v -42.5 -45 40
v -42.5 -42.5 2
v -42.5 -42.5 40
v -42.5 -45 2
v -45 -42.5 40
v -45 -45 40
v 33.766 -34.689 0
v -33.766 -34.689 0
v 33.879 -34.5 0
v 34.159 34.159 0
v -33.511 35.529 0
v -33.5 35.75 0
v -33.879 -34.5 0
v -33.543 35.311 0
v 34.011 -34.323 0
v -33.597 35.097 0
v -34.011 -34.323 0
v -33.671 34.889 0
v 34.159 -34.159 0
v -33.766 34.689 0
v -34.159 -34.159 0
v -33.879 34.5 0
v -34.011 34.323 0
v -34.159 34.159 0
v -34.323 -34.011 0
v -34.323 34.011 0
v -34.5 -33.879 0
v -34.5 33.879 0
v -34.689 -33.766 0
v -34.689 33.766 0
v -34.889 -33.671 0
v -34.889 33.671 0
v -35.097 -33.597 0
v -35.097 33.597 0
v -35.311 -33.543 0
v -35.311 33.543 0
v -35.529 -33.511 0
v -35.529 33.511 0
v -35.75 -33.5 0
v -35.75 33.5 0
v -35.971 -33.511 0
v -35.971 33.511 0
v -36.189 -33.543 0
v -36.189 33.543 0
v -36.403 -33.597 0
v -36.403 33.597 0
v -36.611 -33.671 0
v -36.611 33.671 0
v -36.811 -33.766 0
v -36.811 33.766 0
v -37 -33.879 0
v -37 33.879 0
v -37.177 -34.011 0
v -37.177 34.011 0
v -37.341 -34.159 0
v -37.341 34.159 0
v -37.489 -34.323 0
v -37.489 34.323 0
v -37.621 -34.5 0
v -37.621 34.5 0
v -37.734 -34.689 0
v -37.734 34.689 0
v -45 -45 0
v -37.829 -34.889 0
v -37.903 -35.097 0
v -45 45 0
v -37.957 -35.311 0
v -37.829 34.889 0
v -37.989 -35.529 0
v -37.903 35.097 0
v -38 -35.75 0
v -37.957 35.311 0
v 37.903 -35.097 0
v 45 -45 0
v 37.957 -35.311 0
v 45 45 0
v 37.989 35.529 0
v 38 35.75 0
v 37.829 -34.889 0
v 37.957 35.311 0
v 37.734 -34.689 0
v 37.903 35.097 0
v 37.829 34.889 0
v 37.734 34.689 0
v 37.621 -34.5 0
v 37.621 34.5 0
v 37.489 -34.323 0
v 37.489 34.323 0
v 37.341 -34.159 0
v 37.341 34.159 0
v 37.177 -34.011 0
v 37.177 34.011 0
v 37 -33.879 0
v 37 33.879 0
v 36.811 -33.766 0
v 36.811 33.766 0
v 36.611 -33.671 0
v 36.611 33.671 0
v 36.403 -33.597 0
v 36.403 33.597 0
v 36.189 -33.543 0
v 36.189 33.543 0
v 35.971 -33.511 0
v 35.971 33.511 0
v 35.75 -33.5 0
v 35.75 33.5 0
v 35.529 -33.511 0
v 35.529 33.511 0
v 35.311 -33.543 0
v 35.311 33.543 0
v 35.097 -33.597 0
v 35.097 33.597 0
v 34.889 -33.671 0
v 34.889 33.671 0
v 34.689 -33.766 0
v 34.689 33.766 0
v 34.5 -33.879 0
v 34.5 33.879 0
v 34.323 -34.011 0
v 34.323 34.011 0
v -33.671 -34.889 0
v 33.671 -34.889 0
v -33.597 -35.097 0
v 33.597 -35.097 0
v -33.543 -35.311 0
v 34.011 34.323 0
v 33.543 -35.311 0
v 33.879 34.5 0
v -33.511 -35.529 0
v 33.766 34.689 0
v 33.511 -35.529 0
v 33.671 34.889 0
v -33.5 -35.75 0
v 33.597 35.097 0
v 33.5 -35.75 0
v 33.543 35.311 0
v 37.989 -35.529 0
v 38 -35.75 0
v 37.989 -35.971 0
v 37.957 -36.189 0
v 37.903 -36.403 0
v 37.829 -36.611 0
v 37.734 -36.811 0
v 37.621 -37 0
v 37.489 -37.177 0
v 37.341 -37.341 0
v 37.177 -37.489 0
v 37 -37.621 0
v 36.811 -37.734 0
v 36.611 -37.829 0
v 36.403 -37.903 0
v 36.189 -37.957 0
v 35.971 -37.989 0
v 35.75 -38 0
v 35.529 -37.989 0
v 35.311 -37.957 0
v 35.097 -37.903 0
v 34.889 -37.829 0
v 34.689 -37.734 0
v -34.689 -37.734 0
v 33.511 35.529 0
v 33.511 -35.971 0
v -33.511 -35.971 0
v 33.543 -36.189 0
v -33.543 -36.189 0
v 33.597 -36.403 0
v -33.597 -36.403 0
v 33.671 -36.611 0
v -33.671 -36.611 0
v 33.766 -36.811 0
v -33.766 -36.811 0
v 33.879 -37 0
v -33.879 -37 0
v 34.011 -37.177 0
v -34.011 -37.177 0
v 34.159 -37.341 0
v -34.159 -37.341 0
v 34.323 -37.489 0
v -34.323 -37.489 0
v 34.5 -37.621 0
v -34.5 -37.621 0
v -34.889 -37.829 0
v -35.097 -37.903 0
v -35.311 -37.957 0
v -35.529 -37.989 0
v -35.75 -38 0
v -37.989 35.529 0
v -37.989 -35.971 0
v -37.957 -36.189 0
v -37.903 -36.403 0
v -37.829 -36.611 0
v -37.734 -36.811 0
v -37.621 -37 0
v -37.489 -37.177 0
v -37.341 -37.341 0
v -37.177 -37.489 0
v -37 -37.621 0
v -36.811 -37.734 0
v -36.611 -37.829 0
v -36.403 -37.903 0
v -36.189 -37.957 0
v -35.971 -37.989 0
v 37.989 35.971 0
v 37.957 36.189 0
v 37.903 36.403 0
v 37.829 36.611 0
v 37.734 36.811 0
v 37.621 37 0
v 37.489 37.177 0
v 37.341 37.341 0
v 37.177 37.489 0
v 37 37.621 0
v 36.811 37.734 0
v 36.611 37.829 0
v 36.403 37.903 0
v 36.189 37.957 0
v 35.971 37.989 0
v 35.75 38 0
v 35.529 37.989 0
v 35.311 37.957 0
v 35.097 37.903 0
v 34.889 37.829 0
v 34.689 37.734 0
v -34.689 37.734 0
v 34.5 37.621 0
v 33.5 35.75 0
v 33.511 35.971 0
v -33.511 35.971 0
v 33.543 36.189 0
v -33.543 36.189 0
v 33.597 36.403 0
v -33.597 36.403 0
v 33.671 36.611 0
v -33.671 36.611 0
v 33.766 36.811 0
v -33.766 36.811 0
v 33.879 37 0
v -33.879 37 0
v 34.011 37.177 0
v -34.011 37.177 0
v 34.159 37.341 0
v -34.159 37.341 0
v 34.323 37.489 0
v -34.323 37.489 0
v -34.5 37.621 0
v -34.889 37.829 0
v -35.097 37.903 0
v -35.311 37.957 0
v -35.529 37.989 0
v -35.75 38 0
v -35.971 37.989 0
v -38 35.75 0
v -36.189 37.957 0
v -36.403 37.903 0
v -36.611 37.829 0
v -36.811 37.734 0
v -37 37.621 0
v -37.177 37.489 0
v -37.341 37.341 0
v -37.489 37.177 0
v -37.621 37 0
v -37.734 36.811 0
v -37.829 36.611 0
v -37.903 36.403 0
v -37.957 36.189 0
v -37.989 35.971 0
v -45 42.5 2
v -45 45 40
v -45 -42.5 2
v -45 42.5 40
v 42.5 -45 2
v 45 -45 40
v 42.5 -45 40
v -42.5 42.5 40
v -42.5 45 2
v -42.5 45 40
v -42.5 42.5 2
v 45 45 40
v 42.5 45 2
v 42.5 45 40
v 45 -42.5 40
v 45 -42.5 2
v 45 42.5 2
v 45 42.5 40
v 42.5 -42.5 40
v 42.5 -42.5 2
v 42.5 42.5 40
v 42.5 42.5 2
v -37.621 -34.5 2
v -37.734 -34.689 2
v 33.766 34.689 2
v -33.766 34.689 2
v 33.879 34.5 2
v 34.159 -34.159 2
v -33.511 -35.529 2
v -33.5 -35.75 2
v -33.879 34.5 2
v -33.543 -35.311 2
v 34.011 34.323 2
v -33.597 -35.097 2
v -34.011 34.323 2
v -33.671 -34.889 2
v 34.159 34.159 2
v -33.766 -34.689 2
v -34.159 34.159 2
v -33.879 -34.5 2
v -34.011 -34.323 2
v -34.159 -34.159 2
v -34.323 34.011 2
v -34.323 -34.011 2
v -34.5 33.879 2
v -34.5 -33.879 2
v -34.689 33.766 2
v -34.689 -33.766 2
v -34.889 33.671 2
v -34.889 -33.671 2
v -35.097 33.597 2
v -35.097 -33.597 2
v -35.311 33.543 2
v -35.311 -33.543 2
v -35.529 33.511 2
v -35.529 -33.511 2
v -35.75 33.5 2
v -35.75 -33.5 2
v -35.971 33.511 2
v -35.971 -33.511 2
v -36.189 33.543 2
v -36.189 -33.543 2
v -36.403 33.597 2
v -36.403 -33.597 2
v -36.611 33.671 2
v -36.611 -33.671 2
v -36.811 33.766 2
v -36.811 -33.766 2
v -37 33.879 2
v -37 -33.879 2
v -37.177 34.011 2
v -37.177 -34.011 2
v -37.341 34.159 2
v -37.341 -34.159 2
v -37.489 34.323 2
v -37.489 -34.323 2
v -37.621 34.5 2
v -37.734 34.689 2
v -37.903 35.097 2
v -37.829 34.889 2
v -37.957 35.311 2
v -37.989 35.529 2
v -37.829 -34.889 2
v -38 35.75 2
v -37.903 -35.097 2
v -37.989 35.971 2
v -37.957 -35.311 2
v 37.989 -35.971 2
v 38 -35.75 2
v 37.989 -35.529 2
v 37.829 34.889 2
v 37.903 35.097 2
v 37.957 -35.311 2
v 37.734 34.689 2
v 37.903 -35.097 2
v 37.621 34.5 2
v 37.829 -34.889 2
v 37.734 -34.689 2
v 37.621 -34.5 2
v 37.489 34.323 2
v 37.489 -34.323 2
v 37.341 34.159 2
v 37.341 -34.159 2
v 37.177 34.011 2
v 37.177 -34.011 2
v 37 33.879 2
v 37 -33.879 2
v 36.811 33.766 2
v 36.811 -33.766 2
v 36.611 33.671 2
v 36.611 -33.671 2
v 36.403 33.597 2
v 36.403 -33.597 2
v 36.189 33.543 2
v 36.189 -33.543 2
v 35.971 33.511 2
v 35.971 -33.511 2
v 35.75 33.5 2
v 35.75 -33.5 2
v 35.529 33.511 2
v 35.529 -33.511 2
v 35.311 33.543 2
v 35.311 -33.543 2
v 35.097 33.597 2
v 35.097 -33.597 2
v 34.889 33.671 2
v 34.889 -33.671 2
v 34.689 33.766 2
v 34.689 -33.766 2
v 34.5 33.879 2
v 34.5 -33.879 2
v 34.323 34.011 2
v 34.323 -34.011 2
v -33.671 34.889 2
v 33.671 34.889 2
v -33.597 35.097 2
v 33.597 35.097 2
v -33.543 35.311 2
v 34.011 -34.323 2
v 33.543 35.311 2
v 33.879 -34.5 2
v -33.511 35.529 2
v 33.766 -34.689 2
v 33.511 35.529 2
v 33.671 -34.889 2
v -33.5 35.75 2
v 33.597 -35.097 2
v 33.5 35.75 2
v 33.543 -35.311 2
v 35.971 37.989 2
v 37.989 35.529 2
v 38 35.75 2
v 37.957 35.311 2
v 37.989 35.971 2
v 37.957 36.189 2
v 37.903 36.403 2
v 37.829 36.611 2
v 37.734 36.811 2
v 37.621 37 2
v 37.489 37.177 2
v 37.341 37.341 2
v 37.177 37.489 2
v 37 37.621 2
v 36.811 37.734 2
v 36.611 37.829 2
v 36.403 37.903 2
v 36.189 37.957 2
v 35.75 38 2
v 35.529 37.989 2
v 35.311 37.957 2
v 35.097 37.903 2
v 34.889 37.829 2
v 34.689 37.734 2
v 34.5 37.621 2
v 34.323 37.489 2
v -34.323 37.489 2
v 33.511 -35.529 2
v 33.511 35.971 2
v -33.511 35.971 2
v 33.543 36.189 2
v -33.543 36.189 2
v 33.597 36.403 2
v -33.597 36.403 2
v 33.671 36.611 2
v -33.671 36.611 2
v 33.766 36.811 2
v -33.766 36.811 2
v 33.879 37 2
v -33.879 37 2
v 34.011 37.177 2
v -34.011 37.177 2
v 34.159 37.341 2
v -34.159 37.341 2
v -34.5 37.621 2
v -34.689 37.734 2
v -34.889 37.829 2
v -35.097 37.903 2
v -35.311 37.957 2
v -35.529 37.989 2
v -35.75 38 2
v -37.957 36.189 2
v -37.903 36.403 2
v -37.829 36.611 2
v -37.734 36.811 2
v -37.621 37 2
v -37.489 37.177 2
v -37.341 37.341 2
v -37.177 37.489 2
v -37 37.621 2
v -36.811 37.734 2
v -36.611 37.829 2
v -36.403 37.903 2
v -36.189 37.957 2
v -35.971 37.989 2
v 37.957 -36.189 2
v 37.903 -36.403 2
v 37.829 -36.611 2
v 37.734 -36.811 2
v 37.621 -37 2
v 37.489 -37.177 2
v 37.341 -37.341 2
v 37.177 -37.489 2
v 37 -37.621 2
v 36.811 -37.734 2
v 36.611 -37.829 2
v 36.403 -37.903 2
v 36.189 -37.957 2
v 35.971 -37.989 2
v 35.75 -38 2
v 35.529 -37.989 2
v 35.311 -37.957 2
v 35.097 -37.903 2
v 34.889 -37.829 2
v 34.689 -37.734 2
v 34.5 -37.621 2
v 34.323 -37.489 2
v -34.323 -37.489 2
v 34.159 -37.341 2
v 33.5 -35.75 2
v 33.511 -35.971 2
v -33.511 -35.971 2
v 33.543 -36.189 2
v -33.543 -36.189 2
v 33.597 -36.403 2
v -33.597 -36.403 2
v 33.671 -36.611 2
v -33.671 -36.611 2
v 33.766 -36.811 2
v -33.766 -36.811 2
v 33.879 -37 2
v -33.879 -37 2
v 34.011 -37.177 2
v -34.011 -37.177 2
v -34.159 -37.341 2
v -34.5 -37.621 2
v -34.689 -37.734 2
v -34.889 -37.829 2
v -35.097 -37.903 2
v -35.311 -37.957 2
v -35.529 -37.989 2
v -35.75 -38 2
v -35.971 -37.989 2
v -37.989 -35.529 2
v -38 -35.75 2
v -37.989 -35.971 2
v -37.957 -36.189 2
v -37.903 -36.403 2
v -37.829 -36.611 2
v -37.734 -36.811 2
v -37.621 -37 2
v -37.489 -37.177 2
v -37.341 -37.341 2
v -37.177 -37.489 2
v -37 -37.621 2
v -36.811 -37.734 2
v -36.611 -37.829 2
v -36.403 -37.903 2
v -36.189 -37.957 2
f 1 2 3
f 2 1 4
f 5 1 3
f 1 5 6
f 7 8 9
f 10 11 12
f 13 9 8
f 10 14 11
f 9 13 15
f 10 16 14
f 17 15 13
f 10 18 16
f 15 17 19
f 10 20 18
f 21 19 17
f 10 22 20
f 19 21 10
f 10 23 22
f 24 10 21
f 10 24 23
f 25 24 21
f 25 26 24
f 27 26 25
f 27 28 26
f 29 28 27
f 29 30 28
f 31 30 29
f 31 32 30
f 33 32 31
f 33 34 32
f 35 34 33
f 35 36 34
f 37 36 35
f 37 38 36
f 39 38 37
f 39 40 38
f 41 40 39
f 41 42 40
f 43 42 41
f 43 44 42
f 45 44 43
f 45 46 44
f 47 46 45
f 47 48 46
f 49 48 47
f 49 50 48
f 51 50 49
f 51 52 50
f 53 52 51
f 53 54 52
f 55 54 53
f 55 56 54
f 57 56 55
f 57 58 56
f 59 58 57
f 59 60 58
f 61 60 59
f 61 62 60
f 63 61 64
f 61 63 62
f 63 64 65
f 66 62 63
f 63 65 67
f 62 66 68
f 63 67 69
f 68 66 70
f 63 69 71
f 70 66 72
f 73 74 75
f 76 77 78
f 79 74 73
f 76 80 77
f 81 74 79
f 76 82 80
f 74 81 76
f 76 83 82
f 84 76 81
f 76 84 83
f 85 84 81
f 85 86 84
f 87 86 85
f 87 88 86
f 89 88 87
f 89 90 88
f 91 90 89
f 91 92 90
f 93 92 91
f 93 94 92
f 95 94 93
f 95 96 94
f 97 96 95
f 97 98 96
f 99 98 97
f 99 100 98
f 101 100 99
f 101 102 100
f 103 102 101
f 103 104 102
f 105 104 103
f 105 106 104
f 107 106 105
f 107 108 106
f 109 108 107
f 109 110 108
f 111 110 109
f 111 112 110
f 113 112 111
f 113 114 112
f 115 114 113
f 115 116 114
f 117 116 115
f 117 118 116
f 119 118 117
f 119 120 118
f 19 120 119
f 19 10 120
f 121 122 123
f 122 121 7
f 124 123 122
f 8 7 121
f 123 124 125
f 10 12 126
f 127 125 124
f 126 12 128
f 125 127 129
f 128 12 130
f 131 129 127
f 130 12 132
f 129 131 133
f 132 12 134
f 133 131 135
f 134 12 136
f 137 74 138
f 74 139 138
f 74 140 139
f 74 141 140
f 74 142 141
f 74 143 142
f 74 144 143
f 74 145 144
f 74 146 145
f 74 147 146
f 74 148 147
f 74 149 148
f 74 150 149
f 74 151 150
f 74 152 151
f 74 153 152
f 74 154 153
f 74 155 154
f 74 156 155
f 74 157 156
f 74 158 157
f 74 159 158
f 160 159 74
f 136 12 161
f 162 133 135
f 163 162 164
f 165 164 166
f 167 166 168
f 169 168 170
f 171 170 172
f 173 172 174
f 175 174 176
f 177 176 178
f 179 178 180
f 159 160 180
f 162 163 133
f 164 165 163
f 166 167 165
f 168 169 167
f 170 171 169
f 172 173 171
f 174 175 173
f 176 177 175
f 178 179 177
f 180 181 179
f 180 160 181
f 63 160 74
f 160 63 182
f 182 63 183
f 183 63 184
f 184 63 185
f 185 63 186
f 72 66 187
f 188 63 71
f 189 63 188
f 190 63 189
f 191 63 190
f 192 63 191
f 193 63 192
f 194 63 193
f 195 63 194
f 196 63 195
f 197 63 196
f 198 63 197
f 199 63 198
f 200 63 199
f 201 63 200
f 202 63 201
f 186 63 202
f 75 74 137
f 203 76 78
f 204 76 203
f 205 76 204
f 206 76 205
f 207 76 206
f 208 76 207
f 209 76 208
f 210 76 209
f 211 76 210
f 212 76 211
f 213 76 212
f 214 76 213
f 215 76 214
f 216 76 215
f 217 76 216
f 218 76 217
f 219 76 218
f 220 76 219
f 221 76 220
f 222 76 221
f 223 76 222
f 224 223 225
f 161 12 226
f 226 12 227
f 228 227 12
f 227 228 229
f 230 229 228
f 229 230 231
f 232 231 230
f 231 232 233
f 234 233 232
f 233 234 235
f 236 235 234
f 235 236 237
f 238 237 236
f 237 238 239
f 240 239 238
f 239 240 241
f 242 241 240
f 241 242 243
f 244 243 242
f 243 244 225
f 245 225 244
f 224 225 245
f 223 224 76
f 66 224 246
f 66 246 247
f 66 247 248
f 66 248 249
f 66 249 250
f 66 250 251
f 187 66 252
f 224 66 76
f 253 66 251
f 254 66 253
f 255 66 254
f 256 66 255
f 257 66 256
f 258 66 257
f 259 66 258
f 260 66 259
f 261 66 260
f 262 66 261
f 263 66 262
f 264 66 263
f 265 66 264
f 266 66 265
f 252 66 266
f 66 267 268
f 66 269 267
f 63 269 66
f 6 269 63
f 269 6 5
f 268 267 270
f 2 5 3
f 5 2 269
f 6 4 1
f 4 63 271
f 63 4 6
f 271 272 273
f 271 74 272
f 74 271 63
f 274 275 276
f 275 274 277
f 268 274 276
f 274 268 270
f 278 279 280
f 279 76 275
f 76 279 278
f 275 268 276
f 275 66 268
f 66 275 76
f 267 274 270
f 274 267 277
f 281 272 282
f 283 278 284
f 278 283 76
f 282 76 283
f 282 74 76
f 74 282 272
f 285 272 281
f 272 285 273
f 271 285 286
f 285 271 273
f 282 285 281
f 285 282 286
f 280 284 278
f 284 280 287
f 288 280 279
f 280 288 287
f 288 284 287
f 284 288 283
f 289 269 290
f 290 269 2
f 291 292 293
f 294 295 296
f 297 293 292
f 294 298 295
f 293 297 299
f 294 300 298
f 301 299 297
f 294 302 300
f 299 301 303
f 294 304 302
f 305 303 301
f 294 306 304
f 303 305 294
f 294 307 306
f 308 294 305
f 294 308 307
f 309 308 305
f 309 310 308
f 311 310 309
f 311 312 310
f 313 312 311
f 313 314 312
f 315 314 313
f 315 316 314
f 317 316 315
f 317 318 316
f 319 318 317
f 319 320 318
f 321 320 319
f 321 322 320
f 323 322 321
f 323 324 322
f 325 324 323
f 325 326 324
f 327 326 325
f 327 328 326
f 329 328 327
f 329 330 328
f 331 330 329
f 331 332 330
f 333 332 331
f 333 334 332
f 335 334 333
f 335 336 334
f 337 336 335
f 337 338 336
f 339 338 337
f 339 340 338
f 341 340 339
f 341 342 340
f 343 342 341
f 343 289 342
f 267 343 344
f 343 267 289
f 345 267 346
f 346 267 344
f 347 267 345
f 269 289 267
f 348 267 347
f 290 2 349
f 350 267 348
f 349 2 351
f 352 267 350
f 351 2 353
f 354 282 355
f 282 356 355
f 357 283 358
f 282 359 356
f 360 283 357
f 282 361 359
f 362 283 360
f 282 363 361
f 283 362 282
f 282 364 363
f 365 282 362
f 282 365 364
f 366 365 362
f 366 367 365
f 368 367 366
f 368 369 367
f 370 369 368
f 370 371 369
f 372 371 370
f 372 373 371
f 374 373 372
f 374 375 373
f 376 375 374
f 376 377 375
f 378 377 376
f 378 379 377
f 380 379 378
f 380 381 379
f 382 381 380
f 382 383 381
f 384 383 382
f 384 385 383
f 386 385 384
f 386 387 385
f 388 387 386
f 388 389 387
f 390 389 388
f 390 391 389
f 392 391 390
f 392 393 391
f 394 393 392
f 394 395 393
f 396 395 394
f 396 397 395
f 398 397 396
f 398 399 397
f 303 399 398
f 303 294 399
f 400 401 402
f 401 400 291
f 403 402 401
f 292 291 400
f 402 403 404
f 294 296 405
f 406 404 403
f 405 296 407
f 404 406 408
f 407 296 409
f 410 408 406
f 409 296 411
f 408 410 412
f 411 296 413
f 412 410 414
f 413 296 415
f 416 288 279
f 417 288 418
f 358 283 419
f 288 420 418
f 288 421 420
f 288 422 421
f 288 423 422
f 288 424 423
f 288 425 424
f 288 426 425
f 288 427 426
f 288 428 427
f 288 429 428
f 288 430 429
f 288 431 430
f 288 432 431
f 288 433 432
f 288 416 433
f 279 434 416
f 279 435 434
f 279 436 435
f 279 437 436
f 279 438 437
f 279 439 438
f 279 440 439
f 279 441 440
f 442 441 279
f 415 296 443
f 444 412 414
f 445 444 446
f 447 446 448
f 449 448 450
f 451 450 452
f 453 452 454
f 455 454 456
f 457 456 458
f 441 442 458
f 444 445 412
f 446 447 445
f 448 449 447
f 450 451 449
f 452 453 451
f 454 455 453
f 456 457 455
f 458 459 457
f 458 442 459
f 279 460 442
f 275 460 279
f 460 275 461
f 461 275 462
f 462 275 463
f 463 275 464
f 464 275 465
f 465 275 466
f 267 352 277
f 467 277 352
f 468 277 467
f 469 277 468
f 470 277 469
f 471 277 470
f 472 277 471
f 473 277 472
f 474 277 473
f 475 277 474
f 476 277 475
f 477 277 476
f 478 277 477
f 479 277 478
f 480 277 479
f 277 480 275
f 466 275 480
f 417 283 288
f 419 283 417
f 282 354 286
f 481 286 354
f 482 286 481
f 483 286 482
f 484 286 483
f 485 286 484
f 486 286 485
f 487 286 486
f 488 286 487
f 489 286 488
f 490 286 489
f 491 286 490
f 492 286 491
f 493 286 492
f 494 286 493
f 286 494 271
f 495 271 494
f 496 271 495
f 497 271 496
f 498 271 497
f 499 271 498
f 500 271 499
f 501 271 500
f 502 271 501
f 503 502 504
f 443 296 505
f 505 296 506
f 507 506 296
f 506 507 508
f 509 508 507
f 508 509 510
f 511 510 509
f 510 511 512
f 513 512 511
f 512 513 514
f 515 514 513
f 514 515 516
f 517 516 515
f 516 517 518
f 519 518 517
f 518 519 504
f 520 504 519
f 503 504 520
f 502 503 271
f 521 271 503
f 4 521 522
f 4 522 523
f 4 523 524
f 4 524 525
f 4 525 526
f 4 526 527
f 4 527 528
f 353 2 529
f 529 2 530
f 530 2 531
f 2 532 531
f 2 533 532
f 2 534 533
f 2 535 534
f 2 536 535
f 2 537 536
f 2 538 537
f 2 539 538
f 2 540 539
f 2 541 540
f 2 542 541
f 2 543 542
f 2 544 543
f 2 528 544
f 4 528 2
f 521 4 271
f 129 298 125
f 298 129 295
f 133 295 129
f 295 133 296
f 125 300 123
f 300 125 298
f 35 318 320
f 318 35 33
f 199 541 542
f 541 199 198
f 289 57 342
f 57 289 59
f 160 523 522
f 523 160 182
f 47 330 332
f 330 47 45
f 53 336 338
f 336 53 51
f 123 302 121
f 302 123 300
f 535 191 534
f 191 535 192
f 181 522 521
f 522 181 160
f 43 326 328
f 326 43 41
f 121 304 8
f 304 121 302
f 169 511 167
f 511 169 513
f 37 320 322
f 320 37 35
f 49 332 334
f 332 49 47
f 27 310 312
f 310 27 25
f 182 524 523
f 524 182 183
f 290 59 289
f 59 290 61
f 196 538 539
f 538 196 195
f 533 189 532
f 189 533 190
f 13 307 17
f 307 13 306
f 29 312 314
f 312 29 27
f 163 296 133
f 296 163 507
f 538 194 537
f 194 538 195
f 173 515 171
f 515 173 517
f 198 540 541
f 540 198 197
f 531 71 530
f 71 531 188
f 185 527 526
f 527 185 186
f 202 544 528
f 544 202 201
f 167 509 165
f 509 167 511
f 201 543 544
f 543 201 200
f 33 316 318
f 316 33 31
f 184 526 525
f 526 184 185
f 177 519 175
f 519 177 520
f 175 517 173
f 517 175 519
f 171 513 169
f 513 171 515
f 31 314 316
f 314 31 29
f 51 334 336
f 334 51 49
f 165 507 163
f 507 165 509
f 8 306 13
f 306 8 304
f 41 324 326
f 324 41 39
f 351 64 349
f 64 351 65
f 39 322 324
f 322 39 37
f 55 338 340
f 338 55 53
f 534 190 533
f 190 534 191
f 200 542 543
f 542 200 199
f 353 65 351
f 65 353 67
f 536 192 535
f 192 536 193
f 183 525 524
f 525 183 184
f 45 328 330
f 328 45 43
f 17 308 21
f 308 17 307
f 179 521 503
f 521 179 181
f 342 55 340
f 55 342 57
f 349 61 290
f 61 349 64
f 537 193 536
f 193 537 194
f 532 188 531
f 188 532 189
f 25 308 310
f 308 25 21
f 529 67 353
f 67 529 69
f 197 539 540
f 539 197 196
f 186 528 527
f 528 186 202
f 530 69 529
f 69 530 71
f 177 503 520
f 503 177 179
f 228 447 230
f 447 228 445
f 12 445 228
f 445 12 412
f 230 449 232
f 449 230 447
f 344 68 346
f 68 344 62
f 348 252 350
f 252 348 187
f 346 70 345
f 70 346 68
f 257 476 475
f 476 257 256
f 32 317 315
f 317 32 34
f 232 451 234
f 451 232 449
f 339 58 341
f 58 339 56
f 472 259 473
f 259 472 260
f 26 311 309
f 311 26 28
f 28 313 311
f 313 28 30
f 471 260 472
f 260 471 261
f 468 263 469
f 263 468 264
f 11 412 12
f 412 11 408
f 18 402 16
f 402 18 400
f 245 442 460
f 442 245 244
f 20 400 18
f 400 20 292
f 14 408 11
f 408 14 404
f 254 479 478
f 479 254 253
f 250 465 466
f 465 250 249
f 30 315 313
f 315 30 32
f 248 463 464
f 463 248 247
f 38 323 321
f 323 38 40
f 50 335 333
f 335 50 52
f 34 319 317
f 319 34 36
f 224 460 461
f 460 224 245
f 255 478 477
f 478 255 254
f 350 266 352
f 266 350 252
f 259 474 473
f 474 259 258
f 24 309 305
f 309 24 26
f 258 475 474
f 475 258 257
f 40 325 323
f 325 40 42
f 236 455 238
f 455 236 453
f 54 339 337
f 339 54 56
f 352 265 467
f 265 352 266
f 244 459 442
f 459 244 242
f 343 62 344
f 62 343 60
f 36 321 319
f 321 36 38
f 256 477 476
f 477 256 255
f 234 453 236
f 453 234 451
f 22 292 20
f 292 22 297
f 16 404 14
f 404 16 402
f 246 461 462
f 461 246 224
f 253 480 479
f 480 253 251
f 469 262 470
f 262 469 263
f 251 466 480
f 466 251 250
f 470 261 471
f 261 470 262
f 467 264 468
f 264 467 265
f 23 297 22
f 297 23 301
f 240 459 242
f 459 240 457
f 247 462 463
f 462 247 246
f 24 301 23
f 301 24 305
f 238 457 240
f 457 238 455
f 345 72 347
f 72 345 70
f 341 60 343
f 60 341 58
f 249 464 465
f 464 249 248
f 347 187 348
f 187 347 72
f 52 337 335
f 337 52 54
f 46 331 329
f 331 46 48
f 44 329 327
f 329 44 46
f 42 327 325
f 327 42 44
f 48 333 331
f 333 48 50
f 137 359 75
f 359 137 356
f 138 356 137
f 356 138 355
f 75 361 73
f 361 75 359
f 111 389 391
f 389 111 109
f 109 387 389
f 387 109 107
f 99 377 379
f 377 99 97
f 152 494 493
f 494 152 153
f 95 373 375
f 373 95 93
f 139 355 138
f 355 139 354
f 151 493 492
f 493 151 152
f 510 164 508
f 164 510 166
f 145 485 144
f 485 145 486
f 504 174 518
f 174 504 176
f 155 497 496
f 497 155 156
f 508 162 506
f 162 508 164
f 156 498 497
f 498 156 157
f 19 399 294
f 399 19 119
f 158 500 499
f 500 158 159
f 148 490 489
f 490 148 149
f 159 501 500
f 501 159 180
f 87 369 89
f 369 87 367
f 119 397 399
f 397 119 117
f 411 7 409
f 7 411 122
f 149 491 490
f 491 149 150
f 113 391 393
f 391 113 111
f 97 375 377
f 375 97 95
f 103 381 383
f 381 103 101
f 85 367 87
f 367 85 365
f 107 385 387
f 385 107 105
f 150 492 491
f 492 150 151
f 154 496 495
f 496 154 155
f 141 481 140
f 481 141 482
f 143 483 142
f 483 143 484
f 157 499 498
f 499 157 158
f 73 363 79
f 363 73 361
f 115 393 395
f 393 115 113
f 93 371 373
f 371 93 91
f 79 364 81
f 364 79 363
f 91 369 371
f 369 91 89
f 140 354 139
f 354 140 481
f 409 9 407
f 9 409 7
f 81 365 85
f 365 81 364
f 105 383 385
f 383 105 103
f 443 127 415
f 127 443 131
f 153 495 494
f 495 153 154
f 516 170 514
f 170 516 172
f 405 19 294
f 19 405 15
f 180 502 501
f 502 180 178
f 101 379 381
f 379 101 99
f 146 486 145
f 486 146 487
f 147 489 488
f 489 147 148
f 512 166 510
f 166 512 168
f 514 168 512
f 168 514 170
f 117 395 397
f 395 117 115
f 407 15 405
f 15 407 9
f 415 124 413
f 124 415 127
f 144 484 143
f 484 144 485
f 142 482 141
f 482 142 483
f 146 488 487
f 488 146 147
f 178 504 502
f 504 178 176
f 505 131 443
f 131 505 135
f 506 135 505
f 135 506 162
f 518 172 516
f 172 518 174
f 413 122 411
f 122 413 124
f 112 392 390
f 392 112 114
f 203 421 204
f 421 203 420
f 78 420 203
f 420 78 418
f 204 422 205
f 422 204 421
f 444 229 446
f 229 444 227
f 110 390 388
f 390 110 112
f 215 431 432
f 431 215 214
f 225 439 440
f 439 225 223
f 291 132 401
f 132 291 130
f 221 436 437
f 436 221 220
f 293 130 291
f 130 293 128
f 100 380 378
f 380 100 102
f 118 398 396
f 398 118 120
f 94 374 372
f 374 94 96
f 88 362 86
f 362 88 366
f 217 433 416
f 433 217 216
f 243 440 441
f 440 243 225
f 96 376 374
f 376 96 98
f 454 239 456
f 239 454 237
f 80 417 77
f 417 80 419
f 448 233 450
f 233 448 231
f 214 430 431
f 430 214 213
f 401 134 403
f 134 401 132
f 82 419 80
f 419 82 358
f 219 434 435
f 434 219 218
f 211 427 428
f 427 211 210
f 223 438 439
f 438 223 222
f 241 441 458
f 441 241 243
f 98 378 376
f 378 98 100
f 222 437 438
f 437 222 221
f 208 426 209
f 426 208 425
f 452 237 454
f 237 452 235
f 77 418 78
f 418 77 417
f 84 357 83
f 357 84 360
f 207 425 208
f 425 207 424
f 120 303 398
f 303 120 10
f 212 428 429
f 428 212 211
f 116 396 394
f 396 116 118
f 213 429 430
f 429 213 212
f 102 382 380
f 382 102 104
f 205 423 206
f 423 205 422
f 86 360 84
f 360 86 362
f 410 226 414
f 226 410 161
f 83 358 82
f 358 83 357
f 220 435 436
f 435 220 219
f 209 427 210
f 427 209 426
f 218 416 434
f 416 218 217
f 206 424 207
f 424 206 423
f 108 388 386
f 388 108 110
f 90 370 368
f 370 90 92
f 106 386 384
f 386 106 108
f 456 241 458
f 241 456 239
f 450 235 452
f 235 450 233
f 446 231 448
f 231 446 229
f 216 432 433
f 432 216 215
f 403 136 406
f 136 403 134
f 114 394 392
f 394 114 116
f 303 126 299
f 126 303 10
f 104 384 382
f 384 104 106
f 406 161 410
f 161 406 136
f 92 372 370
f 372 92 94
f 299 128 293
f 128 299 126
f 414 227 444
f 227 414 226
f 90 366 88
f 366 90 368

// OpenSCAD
// DIY magnetic stirrer housing for 80 mm PC case fan
// Print orientation: top plate on bed (z = 0), walls build upward (+Z)

$fn = 64;

// ---- Dimensions (mm) ----
plate_thickness   = 2;     // top plate thickness (z = 0 to 2)
wall_thickness    = 2.5;   // side wall thickness
box_height        = 40;    // outer wall height (top of walls at z = 40)
outer_size        = 90;    // outer length and width (X x Y)
hole_d            = 4.5;   // screw hole diameter (M4)
hole_pattern      = 71.5;  // square pitch of screw holes
notch_width       = 12;    // cable notch width
notch_depth       = 8;     // cable notch depth from open edge
notch_edge_z      = box_height - notch_depth; // notch floor (z = 32)
eps               = 0.5;   // overshoot for clean boolean cuts

// ---- Model ----
difference() {
    union() {
        // Top plate
        translate([-outer_size/2, -outer_size/2, 0])
            cube([outer_size, outer_size, plate_thickness]);

        // Four side walls, rising from plate to open top
        for (sx = [-1, 1], sy = [-1, 1])
            translate([sx > 0 ? outer_size/2 - wall_thickness : -outer_size/2,
                       sy > 0 ? outer_size/2 - wall_thickness : -outer_size/2,
                       0])
                cube([wall_thickness, wall_thickness, box_height]);
    }

    // Screw holes through top plate on centred square pattern
    for (x = [-hole_pattern/2, hole_pattern/2])
        for (y = [-hole_pattern/2, hole_pattern/2])
            translate([x, y, -eps])
                cylinder(d = hole_d, h = plate_thickness + 2*eps);

    // Cable notch in one wall, centred along the wall
    translate([-outer_size/2, -notch_width/2, notch_edge_z])
        cube([outer_size, notch_width, notch_depth + eps]);
}
